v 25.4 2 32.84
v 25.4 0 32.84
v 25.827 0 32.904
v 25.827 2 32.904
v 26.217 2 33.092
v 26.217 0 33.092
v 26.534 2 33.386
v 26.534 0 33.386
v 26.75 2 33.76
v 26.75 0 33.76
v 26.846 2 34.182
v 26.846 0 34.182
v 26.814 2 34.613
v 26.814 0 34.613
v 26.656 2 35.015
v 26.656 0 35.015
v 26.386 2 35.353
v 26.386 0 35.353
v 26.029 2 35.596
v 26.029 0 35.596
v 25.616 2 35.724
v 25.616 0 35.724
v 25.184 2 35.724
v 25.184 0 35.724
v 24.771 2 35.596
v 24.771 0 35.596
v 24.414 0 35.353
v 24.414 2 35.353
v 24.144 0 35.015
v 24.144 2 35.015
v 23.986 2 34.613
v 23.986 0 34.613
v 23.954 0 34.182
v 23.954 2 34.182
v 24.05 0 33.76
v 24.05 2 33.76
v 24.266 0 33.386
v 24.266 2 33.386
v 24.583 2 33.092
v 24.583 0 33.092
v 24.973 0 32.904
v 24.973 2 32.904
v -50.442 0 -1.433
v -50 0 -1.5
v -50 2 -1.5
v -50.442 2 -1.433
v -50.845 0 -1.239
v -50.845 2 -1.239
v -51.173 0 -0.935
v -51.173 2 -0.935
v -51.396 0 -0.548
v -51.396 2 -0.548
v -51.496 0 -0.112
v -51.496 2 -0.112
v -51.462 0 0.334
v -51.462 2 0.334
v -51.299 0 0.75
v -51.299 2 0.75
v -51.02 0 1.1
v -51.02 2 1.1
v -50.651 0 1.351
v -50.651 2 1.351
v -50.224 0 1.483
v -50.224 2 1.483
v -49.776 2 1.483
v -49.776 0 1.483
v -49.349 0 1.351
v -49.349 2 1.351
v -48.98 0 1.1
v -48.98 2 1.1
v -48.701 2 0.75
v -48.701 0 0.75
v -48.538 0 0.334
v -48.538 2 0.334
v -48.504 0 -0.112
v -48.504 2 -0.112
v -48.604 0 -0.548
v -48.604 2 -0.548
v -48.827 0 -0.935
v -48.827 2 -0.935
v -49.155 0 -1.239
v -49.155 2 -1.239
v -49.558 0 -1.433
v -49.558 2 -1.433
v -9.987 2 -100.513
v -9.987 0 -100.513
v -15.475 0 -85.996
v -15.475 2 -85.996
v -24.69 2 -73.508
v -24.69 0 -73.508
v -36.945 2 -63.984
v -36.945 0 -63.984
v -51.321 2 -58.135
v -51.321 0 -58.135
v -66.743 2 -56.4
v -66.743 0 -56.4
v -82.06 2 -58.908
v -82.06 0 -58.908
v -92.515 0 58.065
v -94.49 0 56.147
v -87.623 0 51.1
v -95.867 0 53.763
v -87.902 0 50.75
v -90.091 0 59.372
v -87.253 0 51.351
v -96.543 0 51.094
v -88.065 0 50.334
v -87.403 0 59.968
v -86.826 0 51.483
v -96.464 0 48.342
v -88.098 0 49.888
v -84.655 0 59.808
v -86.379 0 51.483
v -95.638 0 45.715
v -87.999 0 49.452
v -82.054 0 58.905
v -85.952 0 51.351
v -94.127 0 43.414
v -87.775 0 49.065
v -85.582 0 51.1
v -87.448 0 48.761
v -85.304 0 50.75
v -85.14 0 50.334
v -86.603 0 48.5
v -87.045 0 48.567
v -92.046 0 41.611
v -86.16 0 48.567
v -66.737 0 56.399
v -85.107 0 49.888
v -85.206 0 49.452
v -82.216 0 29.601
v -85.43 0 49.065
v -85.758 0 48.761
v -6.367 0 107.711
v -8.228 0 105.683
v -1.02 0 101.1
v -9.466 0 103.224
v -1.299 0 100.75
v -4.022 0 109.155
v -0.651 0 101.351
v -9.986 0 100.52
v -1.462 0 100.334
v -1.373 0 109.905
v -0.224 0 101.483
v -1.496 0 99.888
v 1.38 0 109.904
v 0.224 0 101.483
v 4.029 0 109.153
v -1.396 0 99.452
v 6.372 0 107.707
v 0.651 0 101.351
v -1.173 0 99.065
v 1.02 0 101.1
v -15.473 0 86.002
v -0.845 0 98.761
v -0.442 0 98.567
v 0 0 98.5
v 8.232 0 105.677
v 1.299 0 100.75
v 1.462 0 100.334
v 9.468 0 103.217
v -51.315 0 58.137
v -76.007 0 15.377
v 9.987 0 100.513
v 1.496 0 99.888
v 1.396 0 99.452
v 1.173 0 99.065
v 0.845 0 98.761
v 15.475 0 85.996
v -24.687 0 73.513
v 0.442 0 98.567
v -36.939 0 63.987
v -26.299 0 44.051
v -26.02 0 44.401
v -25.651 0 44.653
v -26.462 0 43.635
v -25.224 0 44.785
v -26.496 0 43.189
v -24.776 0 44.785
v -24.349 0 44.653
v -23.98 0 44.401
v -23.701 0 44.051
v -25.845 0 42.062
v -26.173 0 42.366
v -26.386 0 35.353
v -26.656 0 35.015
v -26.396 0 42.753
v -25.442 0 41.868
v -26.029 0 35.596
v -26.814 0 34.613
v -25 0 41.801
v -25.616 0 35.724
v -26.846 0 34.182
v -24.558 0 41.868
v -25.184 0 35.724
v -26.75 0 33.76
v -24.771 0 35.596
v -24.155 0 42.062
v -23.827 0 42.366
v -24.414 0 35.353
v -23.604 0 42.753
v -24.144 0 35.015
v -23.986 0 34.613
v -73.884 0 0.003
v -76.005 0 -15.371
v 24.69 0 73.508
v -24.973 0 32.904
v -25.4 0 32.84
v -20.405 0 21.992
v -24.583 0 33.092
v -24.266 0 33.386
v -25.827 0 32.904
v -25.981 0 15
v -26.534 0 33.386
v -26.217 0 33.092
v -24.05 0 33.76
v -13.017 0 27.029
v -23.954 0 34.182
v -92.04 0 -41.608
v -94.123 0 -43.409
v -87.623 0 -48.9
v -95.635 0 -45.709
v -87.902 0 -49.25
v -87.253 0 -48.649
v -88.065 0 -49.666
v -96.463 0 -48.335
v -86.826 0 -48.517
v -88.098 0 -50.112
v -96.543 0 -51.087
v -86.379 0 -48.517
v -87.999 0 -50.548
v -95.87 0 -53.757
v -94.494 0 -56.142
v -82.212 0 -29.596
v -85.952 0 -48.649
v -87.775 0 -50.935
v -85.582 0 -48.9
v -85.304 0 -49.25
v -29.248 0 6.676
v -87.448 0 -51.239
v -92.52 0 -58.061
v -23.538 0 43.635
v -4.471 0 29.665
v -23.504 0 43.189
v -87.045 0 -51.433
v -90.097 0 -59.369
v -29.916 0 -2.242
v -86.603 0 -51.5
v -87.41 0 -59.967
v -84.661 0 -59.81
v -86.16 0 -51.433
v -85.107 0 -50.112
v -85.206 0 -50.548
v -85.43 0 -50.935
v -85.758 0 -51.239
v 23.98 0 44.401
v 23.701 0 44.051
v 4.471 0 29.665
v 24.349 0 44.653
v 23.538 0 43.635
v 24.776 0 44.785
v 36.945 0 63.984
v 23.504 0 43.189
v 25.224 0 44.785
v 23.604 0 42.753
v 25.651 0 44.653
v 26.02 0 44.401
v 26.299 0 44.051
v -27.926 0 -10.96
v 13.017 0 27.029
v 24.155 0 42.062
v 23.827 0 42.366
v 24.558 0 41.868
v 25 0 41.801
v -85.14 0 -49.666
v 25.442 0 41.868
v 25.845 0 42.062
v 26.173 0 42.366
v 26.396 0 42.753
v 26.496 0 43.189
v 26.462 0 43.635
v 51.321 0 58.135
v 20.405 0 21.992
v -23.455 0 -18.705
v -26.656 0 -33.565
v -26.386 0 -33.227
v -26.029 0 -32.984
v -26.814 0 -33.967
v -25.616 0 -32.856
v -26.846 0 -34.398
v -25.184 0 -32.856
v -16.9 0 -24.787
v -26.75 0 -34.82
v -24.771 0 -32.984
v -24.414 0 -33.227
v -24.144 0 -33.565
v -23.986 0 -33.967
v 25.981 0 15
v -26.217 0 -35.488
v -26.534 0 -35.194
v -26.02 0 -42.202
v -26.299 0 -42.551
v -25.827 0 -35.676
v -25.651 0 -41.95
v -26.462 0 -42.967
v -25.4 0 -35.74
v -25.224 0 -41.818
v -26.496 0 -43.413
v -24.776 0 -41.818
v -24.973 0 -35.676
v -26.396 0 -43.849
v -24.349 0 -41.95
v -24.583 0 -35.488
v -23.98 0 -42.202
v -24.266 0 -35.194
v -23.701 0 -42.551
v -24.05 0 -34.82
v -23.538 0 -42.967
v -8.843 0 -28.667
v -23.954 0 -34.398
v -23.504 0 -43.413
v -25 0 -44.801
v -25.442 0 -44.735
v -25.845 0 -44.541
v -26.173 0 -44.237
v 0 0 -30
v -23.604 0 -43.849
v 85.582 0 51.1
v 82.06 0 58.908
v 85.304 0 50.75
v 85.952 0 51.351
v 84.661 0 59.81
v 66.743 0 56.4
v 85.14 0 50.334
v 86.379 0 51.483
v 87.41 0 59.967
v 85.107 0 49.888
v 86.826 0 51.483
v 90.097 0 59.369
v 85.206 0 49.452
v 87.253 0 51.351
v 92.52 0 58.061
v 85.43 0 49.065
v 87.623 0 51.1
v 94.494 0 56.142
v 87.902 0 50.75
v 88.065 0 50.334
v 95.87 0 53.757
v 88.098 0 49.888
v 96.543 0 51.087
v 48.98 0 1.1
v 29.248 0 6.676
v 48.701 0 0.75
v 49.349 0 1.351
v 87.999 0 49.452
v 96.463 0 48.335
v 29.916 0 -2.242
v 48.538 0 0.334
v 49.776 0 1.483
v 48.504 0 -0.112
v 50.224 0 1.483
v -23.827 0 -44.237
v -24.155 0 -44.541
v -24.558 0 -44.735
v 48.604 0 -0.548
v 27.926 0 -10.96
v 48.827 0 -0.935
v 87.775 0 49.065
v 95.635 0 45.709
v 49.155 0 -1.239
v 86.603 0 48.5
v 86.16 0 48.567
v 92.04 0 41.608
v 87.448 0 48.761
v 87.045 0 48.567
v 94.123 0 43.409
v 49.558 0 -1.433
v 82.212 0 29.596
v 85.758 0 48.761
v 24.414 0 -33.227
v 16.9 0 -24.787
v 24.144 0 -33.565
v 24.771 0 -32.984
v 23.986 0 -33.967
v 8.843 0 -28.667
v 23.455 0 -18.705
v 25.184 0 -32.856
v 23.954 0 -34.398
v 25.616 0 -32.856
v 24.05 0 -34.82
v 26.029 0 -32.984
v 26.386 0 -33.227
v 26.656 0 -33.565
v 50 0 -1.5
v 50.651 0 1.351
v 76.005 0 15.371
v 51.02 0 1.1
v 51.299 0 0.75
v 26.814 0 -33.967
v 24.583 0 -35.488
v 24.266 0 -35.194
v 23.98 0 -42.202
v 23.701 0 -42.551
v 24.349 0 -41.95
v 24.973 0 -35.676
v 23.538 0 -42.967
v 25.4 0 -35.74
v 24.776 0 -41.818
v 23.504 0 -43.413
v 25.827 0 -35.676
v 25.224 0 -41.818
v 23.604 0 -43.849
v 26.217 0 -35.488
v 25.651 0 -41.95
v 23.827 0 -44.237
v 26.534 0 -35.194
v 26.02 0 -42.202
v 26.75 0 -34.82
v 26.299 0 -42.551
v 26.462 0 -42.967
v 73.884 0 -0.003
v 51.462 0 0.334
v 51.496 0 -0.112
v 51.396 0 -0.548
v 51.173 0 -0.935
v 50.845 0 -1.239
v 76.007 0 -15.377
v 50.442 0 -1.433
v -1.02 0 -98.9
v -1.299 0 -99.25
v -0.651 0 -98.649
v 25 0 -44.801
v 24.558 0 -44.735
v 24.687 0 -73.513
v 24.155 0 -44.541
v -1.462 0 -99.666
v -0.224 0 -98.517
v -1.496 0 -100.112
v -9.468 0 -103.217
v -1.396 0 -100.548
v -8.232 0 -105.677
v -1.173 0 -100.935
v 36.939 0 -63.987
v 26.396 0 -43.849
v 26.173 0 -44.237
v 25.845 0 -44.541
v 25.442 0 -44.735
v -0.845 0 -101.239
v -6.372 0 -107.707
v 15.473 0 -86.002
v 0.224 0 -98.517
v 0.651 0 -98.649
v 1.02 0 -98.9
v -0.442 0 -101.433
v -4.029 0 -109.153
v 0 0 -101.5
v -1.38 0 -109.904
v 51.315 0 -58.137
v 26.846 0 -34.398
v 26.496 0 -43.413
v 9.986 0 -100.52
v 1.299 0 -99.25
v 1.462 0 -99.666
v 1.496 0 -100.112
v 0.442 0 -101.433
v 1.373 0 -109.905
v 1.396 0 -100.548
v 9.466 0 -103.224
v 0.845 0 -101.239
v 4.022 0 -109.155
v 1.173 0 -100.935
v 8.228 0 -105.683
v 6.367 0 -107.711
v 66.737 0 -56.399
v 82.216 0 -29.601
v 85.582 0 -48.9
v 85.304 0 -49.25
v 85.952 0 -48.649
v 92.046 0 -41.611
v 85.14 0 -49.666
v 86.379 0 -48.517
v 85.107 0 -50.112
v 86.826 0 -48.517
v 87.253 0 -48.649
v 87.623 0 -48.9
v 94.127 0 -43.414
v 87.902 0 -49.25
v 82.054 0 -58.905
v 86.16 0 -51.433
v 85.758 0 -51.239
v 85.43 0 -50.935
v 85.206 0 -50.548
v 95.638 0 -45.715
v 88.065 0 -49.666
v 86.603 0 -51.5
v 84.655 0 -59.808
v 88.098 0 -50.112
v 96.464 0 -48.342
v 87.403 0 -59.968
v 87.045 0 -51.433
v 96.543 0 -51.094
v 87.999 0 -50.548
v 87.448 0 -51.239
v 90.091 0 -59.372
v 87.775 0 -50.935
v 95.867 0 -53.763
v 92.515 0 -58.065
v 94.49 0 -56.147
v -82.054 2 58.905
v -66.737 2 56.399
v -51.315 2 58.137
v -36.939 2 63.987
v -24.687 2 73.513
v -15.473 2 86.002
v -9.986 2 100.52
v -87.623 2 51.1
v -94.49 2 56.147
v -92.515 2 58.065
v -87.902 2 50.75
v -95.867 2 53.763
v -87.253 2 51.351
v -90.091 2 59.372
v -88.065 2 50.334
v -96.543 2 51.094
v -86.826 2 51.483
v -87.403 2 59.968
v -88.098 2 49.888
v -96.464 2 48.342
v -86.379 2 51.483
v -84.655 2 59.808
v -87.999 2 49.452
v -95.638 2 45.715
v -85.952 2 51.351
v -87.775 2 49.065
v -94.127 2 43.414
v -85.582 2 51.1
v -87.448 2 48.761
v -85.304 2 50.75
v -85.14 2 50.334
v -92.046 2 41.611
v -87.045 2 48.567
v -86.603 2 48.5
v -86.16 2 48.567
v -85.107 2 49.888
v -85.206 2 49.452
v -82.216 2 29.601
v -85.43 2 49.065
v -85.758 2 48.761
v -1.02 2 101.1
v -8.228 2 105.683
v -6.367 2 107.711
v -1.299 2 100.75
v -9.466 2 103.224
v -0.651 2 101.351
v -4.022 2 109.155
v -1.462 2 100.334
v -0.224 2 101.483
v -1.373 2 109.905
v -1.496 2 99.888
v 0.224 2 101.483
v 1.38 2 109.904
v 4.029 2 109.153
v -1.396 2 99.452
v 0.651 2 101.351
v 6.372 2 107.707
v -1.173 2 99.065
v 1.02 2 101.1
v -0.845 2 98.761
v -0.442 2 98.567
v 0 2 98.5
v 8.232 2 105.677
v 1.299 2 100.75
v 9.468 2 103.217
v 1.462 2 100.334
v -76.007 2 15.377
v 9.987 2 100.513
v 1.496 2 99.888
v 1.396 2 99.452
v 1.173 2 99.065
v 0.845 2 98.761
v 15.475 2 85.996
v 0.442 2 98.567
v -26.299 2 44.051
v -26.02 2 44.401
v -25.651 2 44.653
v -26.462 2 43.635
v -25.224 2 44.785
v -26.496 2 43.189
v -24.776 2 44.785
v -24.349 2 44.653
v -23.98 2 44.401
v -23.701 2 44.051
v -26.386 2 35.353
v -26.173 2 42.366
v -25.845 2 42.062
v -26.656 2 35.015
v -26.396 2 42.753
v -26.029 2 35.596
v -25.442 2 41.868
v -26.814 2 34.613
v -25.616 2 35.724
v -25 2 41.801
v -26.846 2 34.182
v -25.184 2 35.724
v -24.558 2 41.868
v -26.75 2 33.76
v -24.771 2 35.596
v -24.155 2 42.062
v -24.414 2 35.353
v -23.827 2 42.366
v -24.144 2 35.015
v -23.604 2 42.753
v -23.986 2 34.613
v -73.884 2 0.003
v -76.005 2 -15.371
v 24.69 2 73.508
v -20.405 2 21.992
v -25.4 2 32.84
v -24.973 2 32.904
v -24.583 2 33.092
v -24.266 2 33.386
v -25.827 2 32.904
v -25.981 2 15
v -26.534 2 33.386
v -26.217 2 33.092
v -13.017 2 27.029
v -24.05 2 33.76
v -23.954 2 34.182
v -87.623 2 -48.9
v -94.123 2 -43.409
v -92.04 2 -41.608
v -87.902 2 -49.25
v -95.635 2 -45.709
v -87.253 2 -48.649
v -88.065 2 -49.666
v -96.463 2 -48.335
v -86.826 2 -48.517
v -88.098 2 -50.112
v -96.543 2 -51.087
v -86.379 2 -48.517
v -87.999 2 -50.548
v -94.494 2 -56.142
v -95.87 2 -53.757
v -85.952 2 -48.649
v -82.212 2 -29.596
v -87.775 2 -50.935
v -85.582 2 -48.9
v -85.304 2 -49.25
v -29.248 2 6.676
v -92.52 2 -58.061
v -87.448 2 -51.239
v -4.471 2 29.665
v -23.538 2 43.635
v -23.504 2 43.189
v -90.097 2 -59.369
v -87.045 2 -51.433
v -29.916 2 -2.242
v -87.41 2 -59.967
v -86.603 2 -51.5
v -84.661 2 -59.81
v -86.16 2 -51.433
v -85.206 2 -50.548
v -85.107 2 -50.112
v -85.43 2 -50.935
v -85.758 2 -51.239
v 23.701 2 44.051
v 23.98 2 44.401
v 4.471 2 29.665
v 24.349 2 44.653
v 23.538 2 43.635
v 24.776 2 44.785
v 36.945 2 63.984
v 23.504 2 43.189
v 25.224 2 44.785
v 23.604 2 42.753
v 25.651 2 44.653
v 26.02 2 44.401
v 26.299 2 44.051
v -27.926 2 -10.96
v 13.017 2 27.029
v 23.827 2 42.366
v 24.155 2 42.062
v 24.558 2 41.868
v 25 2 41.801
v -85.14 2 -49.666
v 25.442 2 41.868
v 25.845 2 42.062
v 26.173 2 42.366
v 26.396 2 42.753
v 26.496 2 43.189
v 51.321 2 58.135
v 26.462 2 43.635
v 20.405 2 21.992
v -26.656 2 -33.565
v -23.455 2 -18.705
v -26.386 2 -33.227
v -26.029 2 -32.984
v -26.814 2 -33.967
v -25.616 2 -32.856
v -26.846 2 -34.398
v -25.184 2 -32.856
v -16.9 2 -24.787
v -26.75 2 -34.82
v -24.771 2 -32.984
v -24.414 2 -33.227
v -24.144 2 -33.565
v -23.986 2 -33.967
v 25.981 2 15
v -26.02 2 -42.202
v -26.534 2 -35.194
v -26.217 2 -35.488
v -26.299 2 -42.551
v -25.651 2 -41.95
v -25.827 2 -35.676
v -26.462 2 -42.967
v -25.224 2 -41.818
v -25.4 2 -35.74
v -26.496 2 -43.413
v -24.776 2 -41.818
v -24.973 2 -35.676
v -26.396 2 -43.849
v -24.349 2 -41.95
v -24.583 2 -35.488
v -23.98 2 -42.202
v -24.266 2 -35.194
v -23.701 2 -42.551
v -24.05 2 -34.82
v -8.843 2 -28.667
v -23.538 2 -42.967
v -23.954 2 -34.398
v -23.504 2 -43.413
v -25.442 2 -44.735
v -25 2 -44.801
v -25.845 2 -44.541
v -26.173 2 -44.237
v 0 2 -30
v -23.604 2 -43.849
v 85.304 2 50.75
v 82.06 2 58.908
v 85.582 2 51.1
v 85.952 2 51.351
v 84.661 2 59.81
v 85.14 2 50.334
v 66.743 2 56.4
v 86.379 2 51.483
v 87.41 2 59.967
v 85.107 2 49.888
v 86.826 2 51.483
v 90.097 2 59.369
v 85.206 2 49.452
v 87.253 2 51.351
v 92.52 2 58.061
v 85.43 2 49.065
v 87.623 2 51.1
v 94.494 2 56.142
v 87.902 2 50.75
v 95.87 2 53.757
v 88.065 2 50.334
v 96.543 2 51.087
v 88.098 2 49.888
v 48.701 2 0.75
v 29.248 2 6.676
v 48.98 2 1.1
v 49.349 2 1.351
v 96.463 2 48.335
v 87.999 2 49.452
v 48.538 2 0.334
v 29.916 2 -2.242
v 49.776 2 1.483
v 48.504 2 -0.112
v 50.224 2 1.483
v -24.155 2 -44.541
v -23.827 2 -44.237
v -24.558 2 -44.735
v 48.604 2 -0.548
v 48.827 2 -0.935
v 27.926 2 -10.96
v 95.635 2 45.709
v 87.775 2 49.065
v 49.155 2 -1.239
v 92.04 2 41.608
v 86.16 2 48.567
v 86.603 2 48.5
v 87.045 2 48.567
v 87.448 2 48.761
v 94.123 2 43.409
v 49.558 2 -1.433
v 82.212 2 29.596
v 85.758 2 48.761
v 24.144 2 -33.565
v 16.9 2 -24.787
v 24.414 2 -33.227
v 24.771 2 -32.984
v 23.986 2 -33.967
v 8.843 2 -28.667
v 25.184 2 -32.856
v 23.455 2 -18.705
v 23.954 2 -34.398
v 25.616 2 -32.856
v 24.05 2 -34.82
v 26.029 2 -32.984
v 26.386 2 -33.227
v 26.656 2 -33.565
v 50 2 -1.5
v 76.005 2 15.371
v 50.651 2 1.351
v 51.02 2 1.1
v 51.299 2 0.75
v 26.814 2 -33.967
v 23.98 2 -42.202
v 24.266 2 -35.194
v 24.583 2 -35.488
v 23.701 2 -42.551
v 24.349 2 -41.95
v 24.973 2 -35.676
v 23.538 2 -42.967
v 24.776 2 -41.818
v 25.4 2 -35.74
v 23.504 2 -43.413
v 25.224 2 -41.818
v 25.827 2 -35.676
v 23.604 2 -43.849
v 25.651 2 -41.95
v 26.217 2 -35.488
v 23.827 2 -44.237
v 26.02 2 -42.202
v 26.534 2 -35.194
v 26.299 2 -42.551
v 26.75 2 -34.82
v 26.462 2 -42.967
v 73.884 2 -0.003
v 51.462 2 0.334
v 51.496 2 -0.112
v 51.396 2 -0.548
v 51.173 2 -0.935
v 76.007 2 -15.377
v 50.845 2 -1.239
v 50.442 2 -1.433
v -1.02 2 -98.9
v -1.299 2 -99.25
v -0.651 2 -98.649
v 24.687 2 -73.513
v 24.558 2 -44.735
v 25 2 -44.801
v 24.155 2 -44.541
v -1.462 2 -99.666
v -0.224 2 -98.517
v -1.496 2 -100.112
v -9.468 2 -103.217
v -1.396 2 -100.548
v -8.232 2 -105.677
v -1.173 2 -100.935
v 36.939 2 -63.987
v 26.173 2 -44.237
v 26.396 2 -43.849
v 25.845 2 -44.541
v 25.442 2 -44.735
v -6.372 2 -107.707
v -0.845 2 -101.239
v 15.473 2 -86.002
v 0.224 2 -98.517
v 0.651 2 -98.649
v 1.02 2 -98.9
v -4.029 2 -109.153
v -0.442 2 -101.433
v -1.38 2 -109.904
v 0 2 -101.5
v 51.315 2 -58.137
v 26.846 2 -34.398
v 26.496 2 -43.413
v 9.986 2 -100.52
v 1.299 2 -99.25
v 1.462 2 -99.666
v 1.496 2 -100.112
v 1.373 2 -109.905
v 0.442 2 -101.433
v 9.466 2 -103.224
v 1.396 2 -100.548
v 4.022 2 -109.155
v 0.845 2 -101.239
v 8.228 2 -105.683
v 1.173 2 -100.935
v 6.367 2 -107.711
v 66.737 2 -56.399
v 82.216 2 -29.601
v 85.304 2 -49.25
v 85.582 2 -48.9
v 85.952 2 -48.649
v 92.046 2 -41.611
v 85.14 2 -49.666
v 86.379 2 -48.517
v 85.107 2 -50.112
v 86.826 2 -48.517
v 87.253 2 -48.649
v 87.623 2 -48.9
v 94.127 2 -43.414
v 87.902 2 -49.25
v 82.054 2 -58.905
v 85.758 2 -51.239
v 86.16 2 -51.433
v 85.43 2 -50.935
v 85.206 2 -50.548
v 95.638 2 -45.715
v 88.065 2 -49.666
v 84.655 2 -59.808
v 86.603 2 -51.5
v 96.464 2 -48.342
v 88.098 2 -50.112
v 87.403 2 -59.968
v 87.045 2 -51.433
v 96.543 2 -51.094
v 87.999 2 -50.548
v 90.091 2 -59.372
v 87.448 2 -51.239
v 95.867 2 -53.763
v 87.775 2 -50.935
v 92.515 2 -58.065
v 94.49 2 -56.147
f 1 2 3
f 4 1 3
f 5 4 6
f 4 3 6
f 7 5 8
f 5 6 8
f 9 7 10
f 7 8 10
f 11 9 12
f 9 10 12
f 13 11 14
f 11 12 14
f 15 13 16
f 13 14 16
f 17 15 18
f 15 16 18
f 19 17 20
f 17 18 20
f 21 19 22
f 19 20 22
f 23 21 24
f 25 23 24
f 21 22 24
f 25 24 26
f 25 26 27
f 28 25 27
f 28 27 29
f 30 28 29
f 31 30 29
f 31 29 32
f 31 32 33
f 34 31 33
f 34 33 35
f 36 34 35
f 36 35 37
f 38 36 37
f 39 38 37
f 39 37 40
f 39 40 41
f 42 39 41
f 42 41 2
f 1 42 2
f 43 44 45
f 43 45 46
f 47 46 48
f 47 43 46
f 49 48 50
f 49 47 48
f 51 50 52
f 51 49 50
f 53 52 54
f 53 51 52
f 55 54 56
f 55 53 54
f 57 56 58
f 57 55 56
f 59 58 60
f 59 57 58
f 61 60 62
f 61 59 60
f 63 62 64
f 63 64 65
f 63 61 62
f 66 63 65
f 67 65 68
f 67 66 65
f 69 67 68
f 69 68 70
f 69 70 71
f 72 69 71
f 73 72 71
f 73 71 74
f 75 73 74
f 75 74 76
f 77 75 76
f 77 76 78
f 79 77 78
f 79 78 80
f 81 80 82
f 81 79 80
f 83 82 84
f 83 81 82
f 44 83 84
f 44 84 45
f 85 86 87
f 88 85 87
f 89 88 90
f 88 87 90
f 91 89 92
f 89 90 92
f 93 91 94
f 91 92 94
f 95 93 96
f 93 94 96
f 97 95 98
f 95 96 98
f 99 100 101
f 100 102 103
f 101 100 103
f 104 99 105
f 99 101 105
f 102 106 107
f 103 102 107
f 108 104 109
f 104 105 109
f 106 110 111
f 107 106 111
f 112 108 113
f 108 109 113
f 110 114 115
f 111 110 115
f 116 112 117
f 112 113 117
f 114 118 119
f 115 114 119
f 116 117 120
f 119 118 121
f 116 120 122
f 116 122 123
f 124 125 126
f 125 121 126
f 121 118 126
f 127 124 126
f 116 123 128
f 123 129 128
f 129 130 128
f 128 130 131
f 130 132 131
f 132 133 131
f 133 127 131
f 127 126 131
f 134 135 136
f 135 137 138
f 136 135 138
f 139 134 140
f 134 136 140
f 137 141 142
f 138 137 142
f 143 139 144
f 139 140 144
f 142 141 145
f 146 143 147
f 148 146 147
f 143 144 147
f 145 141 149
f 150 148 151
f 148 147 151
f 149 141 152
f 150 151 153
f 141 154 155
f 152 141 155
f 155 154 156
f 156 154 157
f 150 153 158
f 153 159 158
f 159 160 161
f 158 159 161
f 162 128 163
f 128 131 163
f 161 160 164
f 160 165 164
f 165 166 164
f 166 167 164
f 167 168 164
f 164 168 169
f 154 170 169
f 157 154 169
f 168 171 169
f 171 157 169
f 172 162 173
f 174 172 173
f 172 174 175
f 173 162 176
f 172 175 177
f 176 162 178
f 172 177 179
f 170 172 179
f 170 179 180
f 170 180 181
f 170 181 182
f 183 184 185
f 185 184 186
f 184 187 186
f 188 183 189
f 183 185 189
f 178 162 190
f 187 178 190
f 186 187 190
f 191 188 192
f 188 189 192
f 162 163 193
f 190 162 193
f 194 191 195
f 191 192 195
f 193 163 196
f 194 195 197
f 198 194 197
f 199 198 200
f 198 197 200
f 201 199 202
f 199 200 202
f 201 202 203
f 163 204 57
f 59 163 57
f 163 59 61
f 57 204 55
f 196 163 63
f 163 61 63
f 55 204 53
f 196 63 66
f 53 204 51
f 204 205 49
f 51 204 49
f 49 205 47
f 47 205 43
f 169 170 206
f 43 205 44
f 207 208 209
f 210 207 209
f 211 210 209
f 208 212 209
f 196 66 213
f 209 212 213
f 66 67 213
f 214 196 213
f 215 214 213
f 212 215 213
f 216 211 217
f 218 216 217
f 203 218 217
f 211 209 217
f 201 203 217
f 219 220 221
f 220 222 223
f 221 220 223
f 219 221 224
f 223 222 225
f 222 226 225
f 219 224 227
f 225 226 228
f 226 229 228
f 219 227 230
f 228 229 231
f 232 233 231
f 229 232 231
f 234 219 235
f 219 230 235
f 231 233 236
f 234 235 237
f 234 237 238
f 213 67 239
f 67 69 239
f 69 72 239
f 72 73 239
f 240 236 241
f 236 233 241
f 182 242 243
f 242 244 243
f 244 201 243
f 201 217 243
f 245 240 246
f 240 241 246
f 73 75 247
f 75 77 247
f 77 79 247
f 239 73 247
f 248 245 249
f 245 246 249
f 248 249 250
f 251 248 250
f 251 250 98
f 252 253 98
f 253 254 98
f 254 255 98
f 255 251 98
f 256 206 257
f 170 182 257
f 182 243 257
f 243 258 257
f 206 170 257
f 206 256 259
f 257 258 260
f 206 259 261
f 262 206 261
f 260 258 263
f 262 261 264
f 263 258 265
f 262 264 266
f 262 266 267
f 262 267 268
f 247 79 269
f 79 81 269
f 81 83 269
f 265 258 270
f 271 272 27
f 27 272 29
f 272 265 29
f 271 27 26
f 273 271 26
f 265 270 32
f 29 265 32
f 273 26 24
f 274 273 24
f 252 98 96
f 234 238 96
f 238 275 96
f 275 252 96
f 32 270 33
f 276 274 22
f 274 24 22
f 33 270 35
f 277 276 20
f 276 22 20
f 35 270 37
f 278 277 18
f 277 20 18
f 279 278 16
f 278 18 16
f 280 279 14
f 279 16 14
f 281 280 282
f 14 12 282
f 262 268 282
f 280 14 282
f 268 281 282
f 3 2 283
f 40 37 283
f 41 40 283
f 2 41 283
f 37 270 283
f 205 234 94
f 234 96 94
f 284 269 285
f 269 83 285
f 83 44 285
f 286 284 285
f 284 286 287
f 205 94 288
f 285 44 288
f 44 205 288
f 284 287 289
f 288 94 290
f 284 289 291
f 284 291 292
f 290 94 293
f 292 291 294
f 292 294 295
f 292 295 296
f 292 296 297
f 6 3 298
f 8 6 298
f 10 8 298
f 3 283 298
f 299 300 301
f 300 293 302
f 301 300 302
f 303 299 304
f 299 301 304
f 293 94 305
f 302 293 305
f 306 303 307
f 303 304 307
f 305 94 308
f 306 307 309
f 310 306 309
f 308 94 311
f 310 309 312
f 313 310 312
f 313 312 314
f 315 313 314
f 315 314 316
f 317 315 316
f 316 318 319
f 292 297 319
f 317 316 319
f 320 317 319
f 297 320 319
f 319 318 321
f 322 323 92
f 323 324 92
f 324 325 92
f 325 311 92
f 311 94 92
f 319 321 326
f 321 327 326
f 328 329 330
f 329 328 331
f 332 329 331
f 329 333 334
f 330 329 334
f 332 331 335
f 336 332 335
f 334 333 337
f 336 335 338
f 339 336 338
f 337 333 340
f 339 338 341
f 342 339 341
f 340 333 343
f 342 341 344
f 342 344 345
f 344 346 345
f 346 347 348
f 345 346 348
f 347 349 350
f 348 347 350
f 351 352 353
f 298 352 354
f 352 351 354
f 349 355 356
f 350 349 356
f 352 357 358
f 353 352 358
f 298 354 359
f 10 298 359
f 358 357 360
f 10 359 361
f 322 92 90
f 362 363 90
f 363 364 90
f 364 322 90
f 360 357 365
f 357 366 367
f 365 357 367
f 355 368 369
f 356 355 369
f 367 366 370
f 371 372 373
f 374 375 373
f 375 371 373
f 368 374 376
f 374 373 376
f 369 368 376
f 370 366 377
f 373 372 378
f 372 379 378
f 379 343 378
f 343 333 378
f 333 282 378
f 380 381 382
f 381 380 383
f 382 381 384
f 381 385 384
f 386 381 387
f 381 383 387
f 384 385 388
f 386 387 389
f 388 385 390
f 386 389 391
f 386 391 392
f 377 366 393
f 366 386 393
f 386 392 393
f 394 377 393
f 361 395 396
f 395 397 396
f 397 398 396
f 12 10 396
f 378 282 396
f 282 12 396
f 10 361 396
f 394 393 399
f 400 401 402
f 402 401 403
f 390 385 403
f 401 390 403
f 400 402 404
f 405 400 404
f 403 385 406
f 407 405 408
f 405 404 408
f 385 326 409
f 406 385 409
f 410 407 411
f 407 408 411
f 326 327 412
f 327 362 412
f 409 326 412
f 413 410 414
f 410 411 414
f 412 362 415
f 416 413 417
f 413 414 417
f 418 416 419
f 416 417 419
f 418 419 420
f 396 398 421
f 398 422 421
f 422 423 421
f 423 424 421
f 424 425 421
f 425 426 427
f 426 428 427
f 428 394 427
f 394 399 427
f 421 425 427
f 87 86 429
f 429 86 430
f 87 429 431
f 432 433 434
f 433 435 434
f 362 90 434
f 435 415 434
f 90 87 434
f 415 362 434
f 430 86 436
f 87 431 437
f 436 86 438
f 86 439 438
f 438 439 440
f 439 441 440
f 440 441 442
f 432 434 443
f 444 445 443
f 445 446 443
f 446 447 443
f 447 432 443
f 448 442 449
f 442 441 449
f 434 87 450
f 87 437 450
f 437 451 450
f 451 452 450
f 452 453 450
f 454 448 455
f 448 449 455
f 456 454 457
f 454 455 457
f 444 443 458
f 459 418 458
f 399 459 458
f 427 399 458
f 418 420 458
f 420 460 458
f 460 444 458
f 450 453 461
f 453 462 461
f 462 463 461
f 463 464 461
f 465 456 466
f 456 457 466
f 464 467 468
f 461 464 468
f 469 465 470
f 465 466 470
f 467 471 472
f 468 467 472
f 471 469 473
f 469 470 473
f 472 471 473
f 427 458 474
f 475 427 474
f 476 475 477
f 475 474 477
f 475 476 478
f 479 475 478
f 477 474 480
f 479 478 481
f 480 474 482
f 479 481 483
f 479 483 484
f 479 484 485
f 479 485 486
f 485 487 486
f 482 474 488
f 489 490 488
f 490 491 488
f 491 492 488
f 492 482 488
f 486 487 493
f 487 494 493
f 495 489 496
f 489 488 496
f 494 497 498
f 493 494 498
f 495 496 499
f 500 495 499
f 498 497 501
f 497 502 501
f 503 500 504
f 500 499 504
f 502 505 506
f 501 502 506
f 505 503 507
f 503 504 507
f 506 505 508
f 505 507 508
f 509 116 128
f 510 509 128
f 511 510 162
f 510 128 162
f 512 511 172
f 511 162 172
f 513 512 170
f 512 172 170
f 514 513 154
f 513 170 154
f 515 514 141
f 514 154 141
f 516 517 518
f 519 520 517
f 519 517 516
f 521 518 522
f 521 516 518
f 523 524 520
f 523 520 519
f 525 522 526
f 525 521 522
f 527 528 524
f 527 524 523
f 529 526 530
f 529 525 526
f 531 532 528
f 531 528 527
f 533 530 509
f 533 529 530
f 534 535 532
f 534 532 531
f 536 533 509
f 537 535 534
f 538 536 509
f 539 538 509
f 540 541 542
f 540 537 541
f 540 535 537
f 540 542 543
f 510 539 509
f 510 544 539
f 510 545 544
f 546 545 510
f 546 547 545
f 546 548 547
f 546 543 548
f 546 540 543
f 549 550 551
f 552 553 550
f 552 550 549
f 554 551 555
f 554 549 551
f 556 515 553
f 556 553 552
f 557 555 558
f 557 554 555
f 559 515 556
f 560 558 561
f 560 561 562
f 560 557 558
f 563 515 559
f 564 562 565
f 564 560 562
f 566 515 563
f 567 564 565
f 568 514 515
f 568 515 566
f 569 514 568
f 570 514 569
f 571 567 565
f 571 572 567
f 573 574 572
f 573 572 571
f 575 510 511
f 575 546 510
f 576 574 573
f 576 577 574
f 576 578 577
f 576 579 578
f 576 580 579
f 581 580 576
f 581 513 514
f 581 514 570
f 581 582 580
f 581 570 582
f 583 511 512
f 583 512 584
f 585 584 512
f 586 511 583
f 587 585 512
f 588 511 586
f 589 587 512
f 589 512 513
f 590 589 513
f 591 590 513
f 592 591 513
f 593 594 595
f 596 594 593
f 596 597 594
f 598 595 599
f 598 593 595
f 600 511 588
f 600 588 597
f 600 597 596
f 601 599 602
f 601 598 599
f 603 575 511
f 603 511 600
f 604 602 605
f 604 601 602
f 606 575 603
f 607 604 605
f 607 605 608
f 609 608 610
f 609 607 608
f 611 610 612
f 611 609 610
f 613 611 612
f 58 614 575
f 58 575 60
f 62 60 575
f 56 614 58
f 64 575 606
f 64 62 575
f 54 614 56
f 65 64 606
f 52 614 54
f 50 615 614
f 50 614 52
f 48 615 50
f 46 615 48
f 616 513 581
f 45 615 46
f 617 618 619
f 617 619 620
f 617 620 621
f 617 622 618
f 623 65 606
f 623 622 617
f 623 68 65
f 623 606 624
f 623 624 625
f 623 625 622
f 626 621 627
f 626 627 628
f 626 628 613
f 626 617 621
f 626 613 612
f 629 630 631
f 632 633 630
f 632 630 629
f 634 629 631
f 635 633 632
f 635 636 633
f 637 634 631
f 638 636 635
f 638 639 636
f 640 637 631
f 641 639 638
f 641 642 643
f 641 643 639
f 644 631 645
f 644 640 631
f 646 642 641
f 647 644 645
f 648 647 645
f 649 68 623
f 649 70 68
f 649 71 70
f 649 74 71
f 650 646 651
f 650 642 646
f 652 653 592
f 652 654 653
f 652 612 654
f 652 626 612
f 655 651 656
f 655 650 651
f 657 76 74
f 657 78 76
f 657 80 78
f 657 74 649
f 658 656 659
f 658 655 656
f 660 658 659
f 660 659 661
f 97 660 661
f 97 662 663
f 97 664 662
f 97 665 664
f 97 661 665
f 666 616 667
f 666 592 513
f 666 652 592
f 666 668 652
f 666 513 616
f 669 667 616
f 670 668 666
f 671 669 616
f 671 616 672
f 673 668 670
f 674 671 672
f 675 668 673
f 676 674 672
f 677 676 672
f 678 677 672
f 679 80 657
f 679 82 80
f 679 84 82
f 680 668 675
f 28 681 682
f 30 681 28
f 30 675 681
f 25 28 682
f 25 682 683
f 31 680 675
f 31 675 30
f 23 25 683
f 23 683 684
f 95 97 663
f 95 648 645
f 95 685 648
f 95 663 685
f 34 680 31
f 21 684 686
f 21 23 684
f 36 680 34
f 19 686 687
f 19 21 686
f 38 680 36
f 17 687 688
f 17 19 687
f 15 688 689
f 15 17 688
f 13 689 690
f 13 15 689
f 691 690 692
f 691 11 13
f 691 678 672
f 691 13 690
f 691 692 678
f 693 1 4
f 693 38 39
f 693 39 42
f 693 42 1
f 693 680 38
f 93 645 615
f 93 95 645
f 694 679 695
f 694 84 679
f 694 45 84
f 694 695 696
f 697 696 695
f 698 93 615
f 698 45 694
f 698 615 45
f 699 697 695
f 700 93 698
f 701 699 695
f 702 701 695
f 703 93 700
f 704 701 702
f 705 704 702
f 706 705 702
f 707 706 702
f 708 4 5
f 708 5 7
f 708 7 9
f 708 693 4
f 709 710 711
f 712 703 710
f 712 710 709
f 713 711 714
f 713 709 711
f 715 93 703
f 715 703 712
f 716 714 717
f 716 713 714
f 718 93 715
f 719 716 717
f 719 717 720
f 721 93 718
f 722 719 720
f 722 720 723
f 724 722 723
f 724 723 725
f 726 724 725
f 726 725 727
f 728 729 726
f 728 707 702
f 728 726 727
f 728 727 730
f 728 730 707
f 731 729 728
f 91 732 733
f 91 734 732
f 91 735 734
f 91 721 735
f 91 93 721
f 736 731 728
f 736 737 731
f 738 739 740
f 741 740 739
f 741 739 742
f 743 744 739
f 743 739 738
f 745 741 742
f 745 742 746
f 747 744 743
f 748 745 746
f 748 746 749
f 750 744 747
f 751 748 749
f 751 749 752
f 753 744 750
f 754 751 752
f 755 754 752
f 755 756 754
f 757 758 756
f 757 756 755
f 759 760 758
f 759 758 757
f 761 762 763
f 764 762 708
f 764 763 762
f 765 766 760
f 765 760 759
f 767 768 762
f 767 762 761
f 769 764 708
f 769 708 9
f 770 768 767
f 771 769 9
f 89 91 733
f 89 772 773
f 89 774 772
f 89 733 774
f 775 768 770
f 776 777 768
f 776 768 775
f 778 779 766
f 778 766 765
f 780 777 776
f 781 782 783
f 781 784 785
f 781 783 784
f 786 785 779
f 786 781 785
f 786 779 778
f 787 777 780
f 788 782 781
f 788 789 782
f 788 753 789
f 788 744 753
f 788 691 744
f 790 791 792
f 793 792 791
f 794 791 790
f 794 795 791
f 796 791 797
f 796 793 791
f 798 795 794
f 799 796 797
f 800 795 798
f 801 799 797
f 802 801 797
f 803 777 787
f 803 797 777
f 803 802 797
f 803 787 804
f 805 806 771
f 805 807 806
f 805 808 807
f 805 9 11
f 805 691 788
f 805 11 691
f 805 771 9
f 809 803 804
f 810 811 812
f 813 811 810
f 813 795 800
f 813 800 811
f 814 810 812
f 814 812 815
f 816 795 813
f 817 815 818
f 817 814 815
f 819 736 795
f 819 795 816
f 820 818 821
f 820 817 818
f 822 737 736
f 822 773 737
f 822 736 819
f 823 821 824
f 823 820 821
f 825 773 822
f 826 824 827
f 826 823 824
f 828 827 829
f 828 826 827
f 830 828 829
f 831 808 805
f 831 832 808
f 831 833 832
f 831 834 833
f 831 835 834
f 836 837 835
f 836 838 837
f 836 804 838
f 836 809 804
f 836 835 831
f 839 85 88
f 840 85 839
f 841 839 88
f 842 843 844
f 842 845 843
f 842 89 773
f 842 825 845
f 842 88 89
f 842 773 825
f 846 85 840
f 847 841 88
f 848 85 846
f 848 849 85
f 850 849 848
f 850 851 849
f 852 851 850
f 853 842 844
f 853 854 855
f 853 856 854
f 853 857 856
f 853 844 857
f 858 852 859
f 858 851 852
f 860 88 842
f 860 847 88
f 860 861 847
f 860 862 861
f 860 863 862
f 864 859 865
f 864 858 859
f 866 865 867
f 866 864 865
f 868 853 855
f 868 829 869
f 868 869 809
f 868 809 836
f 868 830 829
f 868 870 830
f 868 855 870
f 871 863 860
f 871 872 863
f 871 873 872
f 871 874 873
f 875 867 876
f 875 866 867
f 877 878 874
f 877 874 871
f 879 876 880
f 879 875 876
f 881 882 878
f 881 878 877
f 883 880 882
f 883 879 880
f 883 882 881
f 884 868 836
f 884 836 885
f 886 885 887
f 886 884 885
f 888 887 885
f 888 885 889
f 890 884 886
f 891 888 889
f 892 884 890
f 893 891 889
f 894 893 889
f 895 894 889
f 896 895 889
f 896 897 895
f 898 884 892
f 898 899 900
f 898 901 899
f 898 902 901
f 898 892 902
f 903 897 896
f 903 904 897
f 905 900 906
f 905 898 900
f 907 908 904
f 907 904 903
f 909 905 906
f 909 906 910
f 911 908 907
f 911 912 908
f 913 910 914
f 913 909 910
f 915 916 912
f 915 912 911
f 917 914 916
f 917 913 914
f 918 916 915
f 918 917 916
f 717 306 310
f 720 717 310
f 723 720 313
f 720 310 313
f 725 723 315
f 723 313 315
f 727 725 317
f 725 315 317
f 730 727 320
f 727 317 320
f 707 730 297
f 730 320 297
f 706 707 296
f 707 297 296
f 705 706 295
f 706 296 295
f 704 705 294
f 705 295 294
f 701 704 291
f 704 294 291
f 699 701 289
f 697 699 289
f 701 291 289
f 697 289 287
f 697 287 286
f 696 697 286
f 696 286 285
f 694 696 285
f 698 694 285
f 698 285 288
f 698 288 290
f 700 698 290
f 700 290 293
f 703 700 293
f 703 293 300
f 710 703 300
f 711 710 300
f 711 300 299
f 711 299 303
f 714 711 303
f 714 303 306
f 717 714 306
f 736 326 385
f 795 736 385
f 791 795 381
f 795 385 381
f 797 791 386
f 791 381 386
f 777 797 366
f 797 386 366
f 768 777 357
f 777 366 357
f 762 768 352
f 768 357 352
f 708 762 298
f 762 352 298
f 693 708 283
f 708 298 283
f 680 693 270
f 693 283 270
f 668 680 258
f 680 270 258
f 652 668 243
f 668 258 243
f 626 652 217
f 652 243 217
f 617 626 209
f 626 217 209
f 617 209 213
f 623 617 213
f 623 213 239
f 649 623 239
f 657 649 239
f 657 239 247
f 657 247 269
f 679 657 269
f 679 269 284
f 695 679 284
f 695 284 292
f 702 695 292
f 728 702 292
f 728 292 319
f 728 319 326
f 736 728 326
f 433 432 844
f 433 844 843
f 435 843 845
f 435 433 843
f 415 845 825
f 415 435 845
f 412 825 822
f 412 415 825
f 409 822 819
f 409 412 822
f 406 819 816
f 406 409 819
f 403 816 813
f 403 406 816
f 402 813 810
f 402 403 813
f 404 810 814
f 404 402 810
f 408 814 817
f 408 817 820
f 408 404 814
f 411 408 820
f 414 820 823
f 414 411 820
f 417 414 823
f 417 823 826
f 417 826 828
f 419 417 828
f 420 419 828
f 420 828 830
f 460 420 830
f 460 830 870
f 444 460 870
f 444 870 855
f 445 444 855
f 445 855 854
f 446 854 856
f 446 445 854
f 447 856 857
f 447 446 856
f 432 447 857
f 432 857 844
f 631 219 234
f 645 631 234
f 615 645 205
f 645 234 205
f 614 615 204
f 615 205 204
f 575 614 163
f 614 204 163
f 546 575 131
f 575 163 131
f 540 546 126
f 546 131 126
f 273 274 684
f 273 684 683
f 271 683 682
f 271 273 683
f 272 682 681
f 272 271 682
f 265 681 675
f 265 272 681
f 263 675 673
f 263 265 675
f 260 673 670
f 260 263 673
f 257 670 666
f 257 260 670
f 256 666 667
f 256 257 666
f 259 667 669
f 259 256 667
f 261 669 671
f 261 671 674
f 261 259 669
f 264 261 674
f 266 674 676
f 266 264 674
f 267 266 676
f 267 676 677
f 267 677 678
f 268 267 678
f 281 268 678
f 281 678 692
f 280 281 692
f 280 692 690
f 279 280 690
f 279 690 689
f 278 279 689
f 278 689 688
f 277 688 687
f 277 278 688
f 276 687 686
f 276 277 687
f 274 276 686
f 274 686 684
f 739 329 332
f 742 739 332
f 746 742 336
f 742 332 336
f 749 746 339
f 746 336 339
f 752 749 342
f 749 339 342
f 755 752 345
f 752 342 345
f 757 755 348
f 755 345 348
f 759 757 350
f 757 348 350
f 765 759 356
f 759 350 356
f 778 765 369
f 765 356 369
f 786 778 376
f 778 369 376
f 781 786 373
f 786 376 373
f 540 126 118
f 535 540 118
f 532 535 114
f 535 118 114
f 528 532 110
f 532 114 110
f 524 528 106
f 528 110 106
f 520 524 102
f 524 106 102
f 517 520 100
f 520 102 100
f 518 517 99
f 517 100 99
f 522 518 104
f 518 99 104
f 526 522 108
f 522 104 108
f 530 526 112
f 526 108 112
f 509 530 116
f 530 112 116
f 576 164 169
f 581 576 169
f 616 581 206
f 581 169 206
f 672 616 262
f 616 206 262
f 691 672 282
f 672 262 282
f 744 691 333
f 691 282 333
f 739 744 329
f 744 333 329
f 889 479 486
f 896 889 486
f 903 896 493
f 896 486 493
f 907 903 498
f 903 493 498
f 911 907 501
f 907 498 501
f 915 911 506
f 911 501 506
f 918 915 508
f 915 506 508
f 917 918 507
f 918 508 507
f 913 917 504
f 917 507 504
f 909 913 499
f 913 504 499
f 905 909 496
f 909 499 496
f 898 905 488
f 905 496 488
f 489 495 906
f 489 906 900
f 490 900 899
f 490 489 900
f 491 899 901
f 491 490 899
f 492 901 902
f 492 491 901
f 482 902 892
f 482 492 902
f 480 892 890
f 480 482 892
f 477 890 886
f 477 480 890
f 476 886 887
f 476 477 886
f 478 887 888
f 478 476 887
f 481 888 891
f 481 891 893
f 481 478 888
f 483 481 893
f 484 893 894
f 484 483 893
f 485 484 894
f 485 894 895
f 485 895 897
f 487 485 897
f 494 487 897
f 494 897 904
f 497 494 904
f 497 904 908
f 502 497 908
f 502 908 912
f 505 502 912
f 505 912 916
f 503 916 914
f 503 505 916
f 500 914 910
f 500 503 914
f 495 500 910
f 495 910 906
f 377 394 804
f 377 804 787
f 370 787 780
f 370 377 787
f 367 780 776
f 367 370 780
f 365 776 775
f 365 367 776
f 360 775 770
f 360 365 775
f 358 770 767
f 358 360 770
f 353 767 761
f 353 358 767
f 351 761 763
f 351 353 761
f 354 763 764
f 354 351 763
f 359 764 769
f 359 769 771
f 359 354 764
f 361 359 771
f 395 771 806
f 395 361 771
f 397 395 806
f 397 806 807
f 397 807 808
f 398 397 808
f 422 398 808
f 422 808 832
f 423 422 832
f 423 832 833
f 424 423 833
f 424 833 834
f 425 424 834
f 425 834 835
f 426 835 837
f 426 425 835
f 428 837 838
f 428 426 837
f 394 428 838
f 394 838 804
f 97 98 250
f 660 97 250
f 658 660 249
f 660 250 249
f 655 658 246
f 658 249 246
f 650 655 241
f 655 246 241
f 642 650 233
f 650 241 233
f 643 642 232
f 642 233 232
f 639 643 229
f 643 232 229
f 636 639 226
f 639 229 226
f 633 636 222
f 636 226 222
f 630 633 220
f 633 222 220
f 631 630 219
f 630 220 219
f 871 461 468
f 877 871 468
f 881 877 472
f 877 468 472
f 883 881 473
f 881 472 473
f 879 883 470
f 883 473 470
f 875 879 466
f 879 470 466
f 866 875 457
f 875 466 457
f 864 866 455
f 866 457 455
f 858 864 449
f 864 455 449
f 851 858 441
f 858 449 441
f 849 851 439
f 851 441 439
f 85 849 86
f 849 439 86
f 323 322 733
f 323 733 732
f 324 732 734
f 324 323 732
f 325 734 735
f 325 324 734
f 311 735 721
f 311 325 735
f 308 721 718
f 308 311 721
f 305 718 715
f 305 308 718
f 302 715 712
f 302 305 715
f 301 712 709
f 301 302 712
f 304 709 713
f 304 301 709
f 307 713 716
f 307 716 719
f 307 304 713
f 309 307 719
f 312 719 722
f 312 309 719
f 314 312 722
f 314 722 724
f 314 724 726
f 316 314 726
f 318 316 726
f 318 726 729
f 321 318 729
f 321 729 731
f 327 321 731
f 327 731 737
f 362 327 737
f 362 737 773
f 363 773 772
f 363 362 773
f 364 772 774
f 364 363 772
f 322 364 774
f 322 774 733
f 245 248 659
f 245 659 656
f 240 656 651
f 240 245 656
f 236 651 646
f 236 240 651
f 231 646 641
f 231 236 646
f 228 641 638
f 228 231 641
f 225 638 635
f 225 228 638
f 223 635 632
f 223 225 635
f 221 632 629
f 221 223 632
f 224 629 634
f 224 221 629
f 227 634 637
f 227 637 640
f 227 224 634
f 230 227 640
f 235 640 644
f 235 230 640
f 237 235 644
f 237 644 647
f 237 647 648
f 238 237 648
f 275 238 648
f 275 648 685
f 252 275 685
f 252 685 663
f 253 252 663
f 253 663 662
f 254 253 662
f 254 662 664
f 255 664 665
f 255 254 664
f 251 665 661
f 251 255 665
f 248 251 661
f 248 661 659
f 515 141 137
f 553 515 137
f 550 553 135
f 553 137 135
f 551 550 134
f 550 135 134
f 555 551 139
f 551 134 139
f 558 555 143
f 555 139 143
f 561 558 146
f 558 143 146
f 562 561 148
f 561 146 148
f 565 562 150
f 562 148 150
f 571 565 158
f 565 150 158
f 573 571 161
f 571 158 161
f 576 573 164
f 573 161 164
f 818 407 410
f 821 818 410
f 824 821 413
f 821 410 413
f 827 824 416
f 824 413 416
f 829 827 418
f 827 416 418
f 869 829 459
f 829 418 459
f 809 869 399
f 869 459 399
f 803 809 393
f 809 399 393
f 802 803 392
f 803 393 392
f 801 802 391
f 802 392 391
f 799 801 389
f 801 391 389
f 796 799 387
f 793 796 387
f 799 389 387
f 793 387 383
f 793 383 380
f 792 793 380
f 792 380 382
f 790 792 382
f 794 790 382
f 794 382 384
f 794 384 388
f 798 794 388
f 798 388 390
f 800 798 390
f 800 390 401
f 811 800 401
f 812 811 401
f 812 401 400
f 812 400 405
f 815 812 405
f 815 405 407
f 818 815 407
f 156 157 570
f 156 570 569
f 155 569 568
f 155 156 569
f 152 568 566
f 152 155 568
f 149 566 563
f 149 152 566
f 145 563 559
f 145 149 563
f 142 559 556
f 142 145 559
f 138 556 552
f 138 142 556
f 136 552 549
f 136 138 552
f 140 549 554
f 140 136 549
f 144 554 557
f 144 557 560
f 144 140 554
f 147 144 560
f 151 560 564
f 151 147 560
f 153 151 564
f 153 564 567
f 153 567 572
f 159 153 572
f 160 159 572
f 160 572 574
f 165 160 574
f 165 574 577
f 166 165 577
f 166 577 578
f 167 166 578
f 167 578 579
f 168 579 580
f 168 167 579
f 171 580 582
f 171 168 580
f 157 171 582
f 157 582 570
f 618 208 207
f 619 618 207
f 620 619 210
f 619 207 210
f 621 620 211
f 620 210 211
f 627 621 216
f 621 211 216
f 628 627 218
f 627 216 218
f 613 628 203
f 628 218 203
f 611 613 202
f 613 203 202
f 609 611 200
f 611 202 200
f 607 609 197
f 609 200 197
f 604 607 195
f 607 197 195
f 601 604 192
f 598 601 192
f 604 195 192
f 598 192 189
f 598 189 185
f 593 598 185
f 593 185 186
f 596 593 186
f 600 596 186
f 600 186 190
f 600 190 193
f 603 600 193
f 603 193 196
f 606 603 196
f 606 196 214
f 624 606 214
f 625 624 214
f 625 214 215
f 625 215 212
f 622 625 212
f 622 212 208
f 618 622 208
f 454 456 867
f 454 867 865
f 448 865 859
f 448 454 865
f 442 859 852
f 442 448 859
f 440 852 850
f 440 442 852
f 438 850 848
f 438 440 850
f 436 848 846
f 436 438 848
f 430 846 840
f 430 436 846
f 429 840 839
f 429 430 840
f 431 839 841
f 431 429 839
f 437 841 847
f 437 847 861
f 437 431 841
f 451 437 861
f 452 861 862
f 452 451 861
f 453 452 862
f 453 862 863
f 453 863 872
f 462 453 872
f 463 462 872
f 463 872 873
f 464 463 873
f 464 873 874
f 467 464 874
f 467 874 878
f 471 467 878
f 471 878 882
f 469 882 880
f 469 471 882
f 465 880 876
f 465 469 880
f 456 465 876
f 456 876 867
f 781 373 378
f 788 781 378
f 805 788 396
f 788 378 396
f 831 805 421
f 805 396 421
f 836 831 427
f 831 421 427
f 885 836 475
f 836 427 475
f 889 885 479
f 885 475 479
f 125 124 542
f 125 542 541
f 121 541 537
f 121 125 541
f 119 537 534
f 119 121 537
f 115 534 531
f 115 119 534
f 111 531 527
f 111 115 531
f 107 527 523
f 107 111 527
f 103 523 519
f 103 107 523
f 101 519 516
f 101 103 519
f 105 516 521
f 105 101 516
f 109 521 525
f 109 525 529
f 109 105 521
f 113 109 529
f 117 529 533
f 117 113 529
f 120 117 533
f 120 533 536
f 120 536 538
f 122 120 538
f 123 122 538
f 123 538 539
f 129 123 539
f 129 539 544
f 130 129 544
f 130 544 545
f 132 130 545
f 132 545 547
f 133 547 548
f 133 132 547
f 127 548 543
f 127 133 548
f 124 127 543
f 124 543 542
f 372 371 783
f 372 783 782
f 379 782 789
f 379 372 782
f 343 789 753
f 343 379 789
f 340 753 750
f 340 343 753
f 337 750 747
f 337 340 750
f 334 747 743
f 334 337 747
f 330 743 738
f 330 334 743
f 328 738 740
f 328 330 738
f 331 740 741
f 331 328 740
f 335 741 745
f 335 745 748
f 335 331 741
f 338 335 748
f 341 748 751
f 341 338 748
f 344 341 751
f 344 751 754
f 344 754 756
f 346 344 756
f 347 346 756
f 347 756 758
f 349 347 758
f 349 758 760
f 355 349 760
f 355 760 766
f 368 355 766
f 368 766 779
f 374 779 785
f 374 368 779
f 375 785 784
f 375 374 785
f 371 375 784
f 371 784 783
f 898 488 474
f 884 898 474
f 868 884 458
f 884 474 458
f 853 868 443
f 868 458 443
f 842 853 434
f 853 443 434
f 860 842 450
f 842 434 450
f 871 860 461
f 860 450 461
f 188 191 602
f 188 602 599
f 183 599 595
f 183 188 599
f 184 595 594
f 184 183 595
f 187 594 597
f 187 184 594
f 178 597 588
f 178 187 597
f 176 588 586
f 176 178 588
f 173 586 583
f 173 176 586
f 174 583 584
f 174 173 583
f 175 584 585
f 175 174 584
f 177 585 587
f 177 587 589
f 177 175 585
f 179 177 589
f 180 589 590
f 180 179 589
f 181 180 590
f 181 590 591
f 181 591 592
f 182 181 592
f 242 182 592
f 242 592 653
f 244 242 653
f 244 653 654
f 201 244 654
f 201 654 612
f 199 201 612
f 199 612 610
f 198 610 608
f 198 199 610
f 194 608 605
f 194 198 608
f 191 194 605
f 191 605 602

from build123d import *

# Parameters (mm, degrees)
SKETCH1_R           = 1.5
BOSS_EXTRUDE1_DEPTH = 2
SKETCH3_R           = 30
CUT_EXTRUDE1_DEPTH  = 147.410555656
M3_5_TAPPED_HOLE1_D = 2.9


with BuildPart() as part:
    # Sketch1 → Boss-Extrude1 (new body)
    with BuildSketch(Plane(origin=(0, 0, 0), x_dir=(1, 0, 0), z_dir=(0, 1, 0))):
        with BuildLine():
            ThreePointArc((-92.04043234, 41.60778152), (-73.883899315, -0.003033538), (-92.04602482, -41.611407917))
            ThreePointArc((-92.04602482, -41.611407917), (-95.261127604, -55.002885894), (-82.053611962, -58.905461822))
            ThreePointArc((-82.053611962, -58.905461822), (-36.939322536, -63.986850506), (-9.986476067, -100.51989977))
            ThreePointArc((-9.986476067, -100.51989977), (0.003332664, -109.999999445), (9.986820378, -100.513243342))
            ThreePointArc((9.986820378, -100.513243342), (36.944576778, -63.983816968), (82.059548754, -58.908491853))
            ThreePointArc((82.059548754, -58.908491853), (95.264460267, -54.997113551), (92.04043234, -41.60778152))
            ThreePointArc((92.04043234, -41.60778152), (73.883899315, 0.003033538), (92.04602482, 41.611407917))
            ThreePointArc((92.04602482, 41.611407917), (95.261127604, 55.002885894), (82.053611962, 58.905461822))
            ThreePointArc((82.053611962, 58.905461822), (36.939322536, 63.986850506), (9.986476067, 100.51989977))
            ThreePointArc((9.986476067, 100.51989977), (-0.003332664, 109.999999445), (-9.986820378, 100.513243342))
            ThreePointArc((-9.986820378, 100.513243342), (-36.944576778, 63.983816968), (-82.059548754, 58.908491853))
            ThreePointArc((-82.059548754, 58.908491853), (-95.264460267, 54.997113551), (-92.04043234, 41.60778152))
        make_face()
        with Locations(Location((86.602540378, 50, 0), (0, 0, 90))):
            Circle(SKETCH1_R, mode=Mode.SUBTRACT)
        with Locations(Location((86.602540378, -50, 0), (0, 0, 90))):
            Circle(SKETCH1_R, mode=Mode.SUBTRACT)
        with Locations(Location((0, -100, 0), (0, 0, 90))):
            Circle(SKETCH1_R, mode=Mode.SUBTRACT)
        with Locations(Location((-86.602540378, -50, 0), (0, 0, 90))):
            Circle(SKETCH1_R, mode=Mode.SUBTRACT)
        with Locations(Location((-86.602540378, 50, 0), (0, 0, 90))):
            Circle(SKETCH1_R, mode=Mode.SUBTRACT)
        with Locations(Location((0, 100, 0), (0, 0, 90))):
            Circle(SKETCH1_R, mode=Mode.SUBTRACT)
        with Locations(Location((-25, 43.301270189, 0), (0, 0, 90))):
            Circle(SKETCH1_R, mode=Mode.SUBTRACT)
        with Locations(Location((25, 43.301270189, 0), (0, 0, 90))):
            Circle(SKETCH1_R, mode=Mode.SUBTRACT)
        with Locations(Location((50, 0, 0), (0, 0, 90))):
            Circle(SKETCH1_R, mode=Mode.SUBTRACT)
        with Locations(Location((25, -43.301270189, 0), (0, 0, 90))):
            Circle(SKETCH1_R, mode=Mode.SUBTRACT)
        with Locations(Location((-50, 0, 0), (0, 0, 90))):
            Circle(SKETCH1_R, mode=Mode.SUBTRACT)
        with Locations(Location((-25, -43.301270189, 0), (0, 0, 90))):
            Circle(SKETCH1_R, mode=Mode.SUBTRACT)
    extrude(amount=BOSS_EXTRUDE1_DEPTH)

    # Sketch3 → Cut-Extrude1 (cut, through all)
    with BuildSketch(Plane(origin=(0, 0, 0), x_dir=(-1, 0, 0), z_dir=(0, -1, 0))):
        with Locations(Location((0, 0, 0), (0, 0, 90))):
            Circle(SKETCH3_R)
    extrude(amount=-CUT_EXTRUDE1_DEPTH, mode=Mode.SUBTRACT)

    # M3.5 Tapped Hole1 (through all)
    with Locations(Plane(origin=(-25.4, 2, -34.29), x_dir=(0, 0, 1), z_dir=(0, 1, 0))):
        with Locations((0, 0), (0, 50.8), (68.58, 50.8), (68.58, 0)):
            Hole(M3_5_TAPPED_HOLE1_D / 2)


solid = part.part
